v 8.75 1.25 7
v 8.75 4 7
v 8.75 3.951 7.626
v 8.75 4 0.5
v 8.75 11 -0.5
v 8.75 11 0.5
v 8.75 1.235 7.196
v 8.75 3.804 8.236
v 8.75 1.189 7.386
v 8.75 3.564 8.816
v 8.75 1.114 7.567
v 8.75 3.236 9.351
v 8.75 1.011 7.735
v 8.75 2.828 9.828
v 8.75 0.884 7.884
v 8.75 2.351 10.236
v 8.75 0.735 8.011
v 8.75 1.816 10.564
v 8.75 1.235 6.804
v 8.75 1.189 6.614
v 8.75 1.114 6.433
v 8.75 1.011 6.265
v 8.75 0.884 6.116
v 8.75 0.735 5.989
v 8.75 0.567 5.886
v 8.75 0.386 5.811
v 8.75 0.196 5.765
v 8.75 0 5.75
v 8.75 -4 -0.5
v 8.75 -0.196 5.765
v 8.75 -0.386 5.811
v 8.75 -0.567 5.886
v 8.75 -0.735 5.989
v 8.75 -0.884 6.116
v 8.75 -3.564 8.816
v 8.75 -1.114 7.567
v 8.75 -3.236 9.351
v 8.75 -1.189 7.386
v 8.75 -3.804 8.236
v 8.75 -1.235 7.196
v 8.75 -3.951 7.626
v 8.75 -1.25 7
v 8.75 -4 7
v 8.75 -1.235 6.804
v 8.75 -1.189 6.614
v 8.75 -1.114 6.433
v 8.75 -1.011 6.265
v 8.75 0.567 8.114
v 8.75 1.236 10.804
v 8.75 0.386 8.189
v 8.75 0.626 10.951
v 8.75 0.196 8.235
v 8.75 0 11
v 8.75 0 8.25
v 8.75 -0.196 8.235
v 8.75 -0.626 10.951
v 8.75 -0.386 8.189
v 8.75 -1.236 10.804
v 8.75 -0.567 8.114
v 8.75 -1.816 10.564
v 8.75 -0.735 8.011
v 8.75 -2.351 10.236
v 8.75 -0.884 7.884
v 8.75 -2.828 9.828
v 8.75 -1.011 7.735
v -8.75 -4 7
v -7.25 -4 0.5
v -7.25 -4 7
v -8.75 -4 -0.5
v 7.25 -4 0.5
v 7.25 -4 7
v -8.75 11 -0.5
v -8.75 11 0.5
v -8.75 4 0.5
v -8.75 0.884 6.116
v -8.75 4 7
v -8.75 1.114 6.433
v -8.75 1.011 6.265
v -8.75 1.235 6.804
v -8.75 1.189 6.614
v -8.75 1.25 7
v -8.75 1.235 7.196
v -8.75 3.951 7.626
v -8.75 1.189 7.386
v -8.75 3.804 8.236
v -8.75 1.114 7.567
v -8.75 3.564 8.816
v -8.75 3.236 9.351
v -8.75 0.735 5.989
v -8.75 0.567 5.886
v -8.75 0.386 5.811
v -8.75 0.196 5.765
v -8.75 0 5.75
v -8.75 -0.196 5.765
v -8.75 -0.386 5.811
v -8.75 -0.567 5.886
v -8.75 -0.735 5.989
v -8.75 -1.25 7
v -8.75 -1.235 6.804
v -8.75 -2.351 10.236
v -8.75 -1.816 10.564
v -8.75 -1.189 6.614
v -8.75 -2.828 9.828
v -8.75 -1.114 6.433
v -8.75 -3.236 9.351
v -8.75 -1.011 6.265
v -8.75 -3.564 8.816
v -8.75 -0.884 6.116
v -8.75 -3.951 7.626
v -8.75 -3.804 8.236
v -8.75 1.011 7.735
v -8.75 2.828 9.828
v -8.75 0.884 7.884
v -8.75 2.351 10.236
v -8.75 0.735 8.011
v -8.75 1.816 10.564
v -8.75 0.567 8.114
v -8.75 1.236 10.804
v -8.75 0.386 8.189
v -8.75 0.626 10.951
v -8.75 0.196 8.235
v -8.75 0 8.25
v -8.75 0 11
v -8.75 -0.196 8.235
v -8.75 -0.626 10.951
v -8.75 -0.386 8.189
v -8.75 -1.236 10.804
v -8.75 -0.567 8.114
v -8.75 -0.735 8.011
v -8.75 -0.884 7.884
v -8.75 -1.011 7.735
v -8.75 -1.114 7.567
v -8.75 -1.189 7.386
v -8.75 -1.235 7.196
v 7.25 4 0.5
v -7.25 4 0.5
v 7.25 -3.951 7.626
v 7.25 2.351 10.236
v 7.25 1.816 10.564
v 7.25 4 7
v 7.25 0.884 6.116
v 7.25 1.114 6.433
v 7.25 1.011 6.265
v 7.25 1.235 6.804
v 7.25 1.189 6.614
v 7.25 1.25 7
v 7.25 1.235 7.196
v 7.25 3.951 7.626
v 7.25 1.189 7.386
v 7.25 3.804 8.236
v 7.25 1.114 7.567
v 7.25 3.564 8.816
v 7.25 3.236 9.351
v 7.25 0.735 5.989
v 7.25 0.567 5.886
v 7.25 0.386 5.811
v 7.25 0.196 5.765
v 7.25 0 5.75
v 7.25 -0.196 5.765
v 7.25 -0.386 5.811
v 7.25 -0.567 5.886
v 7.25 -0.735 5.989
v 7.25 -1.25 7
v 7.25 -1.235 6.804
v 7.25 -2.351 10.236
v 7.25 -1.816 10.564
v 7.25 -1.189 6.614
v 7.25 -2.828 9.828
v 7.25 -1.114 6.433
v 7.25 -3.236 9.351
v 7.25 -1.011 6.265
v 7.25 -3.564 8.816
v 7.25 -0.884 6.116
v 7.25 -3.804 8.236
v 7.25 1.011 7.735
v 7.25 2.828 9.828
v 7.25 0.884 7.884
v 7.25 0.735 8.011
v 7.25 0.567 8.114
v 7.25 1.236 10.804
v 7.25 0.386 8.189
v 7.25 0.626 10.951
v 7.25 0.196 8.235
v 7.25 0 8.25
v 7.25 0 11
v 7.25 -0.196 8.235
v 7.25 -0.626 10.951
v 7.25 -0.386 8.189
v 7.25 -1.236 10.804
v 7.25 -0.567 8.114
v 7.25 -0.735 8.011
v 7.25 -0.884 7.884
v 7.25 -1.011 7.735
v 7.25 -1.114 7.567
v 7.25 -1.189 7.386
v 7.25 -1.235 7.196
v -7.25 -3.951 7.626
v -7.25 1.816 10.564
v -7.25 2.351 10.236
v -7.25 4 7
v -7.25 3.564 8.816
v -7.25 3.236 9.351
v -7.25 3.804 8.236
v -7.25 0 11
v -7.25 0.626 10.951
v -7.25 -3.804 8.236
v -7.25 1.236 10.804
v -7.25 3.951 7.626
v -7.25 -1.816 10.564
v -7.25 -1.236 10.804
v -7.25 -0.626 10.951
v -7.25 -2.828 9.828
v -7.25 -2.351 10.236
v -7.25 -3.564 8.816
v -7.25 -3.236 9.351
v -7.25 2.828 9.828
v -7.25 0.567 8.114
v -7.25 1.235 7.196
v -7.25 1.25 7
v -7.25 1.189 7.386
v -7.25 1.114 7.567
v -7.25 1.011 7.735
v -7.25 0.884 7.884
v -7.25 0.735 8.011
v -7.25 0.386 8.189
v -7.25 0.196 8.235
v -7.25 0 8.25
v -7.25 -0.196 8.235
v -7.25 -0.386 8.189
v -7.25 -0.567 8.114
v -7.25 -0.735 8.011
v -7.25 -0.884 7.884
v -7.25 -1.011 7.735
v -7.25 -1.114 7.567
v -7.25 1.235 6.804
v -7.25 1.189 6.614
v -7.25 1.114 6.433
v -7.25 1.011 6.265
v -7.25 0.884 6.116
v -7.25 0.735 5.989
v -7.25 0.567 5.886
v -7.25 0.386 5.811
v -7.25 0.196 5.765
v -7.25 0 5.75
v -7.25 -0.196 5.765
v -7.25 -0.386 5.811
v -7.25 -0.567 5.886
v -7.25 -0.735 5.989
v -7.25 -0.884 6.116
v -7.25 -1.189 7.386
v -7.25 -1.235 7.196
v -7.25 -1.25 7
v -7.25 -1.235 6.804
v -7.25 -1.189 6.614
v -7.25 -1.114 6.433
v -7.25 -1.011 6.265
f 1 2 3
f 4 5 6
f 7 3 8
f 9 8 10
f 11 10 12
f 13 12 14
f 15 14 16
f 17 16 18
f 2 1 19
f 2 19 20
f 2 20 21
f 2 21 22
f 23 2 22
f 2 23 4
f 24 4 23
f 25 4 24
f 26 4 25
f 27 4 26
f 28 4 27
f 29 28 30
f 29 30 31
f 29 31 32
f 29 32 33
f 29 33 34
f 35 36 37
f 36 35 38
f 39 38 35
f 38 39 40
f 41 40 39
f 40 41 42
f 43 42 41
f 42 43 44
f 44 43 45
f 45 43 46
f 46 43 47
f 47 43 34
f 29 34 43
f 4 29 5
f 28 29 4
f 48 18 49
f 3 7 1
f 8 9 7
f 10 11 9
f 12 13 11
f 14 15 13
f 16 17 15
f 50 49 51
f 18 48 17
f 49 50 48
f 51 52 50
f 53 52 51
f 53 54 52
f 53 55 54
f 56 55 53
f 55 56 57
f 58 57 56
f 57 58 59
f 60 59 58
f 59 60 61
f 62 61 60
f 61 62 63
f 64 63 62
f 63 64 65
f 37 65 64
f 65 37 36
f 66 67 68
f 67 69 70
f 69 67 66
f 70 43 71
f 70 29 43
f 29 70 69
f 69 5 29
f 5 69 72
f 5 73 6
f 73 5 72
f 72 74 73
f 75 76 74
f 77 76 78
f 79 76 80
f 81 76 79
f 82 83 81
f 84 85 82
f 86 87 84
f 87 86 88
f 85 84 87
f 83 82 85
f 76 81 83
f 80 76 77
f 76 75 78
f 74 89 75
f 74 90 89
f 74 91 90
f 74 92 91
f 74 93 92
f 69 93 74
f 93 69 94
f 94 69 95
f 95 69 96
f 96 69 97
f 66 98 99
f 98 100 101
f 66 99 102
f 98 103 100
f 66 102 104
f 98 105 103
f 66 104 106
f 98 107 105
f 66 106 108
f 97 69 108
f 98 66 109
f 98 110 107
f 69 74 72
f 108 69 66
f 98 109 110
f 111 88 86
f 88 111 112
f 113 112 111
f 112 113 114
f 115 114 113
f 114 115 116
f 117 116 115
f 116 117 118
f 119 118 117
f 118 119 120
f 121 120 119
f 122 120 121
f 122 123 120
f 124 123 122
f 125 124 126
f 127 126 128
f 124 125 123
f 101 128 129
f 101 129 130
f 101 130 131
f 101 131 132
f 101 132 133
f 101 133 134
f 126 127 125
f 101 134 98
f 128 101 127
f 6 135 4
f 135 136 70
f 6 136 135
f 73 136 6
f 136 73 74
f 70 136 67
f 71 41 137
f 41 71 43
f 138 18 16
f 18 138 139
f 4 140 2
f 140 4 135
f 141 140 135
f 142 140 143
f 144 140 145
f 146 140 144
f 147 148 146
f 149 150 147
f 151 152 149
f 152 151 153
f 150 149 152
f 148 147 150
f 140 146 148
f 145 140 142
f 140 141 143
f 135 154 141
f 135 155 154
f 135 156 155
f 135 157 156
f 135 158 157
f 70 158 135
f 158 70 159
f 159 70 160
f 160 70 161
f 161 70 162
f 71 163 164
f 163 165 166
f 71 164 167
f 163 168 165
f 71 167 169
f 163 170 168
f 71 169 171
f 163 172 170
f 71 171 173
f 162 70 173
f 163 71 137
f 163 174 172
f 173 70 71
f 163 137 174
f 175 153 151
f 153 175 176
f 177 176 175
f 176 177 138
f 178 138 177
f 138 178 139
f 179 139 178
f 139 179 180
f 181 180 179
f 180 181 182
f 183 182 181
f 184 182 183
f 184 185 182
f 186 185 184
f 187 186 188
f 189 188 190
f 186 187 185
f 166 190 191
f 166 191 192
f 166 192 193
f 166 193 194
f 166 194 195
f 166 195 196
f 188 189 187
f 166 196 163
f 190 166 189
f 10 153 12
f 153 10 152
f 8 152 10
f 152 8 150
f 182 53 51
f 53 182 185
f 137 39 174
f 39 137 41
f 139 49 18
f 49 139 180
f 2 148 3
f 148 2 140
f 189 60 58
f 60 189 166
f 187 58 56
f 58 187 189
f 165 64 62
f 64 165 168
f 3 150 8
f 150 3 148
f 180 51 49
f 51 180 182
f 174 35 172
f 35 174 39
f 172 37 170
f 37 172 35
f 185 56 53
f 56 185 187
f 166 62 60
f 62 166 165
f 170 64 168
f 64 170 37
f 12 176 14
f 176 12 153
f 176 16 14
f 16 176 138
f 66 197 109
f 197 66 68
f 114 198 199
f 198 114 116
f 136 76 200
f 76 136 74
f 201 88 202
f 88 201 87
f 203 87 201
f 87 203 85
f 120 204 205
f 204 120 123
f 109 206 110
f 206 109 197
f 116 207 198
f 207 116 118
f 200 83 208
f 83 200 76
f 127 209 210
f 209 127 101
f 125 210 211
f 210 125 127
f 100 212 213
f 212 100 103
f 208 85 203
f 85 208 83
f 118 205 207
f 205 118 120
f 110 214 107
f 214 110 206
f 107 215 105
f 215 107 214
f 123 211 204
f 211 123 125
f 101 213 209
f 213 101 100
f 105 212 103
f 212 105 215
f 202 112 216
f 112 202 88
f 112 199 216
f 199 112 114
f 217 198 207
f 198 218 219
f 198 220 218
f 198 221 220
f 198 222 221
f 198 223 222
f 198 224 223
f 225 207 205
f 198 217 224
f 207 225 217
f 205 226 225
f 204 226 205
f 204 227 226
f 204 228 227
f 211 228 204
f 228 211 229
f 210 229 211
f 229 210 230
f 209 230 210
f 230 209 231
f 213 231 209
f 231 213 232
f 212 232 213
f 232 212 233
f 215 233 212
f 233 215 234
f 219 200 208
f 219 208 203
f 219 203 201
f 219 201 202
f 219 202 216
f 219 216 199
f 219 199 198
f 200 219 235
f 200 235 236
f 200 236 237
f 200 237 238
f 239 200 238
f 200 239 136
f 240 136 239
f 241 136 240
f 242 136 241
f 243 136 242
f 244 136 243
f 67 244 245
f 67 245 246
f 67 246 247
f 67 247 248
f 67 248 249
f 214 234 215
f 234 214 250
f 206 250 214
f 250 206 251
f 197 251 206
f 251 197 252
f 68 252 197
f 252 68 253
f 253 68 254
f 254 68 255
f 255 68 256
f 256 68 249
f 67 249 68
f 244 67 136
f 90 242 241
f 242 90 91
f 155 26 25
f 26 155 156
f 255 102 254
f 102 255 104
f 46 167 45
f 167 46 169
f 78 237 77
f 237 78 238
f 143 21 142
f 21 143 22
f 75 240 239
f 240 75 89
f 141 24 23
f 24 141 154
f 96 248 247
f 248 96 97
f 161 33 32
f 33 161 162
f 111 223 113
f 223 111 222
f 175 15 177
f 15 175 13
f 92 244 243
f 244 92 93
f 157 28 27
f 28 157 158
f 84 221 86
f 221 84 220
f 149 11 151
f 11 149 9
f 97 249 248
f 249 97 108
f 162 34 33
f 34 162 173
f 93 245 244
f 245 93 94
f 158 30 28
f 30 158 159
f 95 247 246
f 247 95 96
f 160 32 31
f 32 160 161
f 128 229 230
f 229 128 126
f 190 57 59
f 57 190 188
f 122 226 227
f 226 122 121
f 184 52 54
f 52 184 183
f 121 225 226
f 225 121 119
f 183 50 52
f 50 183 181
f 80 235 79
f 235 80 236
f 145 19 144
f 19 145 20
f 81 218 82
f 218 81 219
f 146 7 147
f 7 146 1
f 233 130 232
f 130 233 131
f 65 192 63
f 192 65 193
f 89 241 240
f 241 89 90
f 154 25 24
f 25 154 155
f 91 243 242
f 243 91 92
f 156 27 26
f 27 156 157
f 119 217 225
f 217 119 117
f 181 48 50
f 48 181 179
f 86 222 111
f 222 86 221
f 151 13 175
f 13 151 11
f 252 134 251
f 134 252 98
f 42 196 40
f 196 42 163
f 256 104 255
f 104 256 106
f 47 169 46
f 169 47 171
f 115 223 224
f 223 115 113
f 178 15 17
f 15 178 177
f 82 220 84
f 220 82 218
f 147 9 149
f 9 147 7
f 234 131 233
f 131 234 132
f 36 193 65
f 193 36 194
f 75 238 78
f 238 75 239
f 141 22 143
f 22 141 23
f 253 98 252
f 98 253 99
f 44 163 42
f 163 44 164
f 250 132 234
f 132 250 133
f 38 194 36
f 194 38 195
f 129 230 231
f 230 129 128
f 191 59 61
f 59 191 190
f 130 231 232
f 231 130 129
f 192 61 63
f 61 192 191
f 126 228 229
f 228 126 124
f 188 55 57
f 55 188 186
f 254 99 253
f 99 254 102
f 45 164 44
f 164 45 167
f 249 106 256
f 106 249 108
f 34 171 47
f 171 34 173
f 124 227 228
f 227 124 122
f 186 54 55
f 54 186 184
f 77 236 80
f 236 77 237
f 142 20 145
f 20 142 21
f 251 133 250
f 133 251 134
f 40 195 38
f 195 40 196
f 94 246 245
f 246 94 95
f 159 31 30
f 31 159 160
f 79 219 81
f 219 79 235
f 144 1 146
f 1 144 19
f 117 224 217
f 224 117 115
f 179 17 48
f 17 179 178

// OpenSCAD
$fn=40;

// This is for https://www.thingiverse.com/thing:2591811


// length of mounting strip base
sx = 50 ; 

// widith of mounting strip base
sy = 15 ;

module hook(base_length)
{
    tol=0.5;
    screw_dia=2;
    slit_depth=2-tol;
    slit_width=16;
    slight_height=7;
    translate([0,0,slight_height])
    difference()
    {
        union()
        {
            // Base
            translate([0,base_length/2-screw_dia*2,0])
            hull()
            {
                translate([-slit_width/2,0,-slight_height])
                    cube([slit_depth,base_length,1],center=true);
                translate([slit_width/2,0,-slight_height])
                    cube([slit_depth,base_length,1],center=true);
            }
            hull()
            {
                translate([slit_width/2,0,0])
                    rotate([0,90,0])
                        cylinder(r=screw_dia*2,h=slit_depth,center=true);
                translate([slit_width/2,0,-slight_height])
                    cube([slit_depth,screw_dia*4,0.001],center=true);
            }
            hull()
            {
                translate([-slit_width/2,0,0])
                    rotate([0,90,0])
                        cylinder(r=screw_dia*2,h=slit_depth,center=true);
                translate([-slit_width/2,0,-slight_height])
                    cube([slit_depth,screw_dia*4,0.001],center=true);
            }
        }
        // Screw
        #rotate([0,90,0])
            cylinder(r=(screw_dia+tol)/2,h=100,center=true);
    }
}

hook(15);
